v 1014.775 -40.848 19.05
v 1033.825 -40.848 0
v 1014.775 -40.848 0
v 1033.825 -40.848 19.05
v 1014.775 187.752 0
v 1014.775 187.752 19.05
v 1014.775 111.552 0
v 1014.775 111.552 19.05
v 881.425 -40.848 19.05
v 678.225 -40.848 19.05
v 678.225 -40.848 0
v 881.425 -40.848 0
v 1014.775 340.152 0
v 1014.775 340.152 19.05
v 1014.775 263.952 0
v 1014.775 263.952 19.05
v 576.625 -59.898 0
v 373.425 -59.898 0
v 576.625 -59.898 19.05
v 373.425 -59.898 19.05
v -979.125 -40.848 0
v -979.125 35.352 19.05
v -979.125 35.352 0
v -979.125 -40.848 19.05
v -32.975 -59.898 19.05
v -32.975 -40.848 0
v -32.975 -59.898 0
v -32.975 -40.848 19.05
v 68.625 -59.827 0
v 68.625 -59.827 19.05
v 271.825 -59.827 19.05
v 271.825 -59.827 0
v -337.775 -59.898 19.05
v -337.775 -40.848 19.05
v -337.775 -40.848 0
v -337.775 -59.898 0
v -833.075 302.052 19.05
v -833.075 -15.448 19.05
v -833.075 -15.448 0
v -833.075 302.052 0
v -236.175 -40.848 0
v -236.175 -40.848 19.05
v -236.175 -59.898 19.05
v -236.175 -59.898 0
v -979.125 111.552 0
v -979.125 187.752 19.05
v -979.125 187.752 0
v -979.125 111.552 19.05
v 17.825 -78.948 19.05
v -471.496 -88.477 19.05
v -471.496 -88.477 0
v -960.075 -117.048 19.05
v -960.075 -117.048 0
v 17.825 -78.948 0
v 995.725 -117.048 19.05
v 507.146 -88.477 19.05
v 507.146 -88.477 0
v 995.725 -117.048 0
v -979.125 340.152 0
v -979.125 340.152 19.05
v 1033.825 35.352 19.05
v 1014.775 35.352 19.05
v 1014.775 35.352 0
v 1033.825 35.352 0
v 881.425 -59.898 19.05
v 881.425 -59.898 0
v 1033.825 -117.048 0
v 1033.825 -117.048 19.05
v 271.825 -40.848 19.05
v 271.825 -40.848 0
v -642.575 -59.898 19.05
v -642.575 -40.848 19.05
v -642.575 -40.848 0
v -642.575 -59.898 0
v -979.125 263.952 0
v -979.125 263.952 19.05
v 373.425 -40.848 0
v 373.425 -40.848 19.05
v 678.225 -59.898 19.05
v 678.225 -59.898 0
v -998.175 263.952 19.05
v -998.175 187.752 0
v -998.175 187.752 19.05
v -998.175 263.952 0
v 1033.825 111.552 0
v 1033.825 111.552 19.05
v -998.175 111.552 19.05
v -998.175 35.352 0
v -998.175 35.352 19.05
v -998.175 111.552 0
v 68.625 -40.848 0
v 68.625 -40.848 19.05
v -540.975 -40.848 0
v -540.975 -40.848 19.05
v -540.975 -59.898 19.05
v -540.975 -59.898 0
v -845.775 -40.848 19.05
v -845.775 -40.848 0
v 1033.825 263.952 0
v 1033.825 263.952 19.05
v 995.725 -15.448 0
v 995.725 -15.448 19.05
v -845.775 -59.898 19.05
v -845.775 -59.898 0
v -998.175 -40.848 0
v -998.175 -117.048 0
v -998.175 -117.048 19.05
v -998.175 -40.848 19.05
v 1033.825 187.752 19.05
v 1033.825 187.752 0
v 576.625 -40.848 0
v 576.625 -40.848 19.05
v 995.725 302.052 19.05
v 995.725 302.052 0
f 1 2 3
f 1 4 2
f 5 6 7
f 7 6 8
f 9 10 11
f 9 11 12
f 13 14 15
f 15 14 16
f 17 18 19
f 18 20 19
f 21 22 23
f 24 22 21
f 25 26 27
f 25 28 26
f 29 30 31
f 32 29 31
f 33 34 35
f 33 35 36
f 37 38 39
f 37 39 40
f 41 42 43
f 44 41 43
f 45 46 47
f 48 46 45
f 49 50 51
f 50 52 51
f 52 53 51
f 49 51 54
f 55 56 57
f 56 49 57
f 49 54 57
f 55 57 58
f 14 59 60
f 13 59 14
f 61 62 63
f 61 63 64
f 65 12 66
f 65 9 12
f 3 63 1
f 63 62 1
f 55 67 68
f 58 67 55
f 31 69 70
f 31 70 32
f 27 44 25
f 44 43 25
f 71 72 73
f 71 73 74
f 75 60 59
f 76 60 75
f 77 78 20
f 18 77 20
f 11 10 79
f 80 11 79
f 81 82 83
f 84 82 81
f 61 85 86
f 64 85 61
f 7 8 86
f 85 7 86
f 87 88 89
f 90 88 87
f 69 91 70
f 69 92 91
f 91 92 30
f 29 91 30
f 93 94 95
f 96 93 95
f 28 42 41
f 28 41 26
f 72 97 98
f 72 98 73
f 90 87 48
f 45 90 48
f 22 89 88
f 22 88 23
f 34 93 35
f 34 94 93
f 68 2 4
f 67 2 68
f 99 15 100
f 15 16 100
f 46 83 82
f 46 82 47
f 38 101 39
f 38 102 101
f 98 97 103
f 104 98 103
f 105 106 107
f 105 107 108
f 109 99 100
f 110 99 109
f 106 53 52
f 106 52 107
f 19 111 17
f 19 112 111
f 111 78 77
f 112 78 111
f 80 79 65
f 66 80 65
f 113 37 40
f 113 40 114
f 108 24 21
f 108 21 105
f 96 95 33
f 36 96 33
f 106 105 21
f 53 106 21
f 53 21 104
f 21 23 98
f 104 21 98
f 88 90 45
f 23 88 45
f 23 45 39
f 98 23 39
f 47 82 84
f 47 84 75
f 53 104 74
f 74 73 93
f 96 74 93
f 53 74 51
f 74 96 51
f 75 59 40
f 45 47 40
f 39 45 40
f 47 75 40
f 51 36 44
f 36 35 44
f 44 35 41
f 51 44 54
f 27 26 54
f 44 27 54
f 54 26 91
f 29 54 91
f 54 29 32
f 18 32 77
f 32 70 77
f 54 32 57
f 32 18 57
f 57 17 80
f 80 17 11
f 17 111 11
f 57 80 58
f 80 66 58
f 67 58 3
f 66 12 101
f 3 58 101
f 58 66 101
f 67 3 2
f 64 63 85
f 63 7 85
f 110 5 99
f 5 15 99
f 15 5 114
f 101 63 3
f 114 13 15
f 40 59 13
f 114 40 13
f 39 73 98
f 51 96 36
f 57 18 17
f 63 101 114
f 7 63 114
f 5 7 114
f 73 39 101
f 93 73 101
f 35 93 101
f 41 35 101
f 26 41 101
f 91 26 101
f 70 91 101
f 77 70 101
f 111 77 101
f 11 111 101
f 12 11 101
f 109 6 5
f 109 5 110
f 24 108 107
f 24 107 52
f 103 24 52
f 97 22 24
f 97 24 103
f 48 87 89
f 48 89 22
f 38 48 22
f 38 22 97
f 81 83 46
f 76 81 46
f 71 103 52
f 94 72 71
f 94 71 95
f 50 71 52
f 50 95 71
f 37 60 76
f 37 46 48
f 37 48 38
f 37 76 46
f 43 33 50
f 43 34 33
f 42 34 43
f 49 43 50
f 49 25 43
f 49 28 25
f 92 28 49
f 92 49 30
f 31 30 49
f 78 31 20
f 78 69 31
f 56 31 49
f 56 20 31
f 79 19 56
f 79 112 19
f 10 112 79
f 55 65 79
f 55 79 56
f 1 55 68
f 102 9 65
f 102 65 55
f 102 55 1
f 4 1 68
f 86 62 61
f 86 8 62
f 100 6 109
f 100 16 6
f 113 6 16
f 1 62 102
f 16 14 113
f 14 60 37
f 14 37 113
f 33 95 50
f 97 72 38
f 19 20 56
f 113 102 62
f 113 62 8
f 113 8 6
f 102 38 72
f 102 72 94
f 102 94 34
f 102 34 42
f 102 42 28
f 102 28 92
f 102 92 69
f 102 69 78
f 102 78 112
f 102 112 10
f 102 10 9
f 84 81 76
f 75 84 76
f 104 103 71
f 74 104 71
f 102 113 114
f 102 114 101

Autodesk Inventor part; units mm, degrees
ref_plane "YZ Plane" through (0, 0, 0) normal (1, 0, 0) x (0, 1, 0)
ref_plane "XZ Plane" through (0, 0, 0) normal (0, 1, 0) x (-1, 0, 0)
ref_plane "XY Plane" through (0, 0, 0) normal (0, 0, 1) x (1, 0, 0)
sketch "Sketch1" plane through (0, 0, 0) normal (0, 0, 1) x (1, 0, 0)
  line L0 (-998.1754, 340.1521) -> (1033.8246, 340.1521)
  line L1 (1033.8246, 340.1521) -> (1033.8246, -117.0479)
  line L2 (-998.1754, -117.0479) -> (-998.1754, 340.1521)
  arc A0 (995.7246, -117.0479) -> (-960.0754, -117.0479) centre (17.8246, -12647.7146) ccw
  line L3 (1033.8246, -117.0479) -> (995.7246, -117.0479)
  line L4 (-960.0754, -117.0479) -> (-998.1754, -117.0479)
  point P0 (0, 0)
  dimension "d0" = 2032
  dimension "d1" = 457.2
extrude "Extrusion1" add sketch "Sketch1" along normal blind 19.05
sketch "Sketch2" plane through (0, 0, 19.05) normal (0, 0, 1) x (1, 0, 0)
  line L0 (1033.8246, 340.1521) -> (-998.1754, 340.1521) projected
  line L1 (-998.1754, -117.0479) -> (-960.0754, -117.0479) projected
  line L2 (-998.1754, 340.1521) -> (-979.1254, 340.1521)
  line L3 (-979.1254, 340.1521) -> (-979.1254, -117.0479)
  line L4 (-979.1254, -117.0479) -> (-998.1754, -117.0479)
  line L5 (-998.1754, -117.0479) -> (-998.1754, 340.1521)
  line L6 (1033.8246, -117.0479) -> (1033.8246, 340.1521) projected
  line L7 (1033.8246, 340.1521) -> (1014.7746, 340.1521)
  line L8 (1014.7746, 340.1521) -> (1014.7746, -117.0479)
  line L9 (1014.7746, -117.0479) -> (1033.8246, -117.0479)
  line L10 (1033.8246, -117.0479) -> (1033.8246, 340.1521)
  line L11 (-998.1754, 340.1521) -> (-998.1754, -117.0479) projected
  line L12 (-998.1754, 263.9521) -> (-979.1254, 263.9521)
  line L13 (1014.7746, 263.9521) -> (1033.8246, 263.9521)
  line L14 (-998.1754, 187.7521) -> (-979.1254, 187.7521)
  line L15 (1014.7746, 187.7521) -> (1033.8246, 187.7521)
  line L16 (-998.1754, 111.5521) -> (-979.1254, 111.5521)
  line L17 (1014.7746, 111.5521) -> (1033.8246, 111.5521)
  line L18 (-998.1754, 35.3521) -> (-979.1254, 35.3521)
  line L19 (1014.7746, 35.3521) -> (1033.8246, 35.3521)
  line L20 (1033.8246, -40.8479) -> (1014.7746, -40.8479)
  line L21 (-979.1254, -40.8479) -> (-998.1754, -40.8479)
  point P0 (0, 0)
  dimension "d7" = 19.05
  dimension "d8" = 19.05
extrude "Extrusion2" cut sketch "Sketch2" against normal blind 19.05 contours L6 L13 L8 L0 | L3 L12 L5 L0 | L6 L17 L8 L15 | L3 L16 L5 L14 | L6 L20 L8 L19 | L3 L21 L5 L18
sketch "Sketch4" plane through (0, 0, 19.05) normal (0, 0, 1) x (1, 0, 0)
  line L0 (-845.7754, -40.8479) -> (-845.7754, -59.8979)
  line L1 (-998.1754, 111.5521) -> (-998.1754, 35.3521) projected
  line L2 (-642.5754, -40.8479) -> (-642.5754, -59.8979)
  line L3 (-540.9754, -40.8479) -> (-540.9754, -59.8979)
  line L4 (-337.7754, -40.8479) -> (-337.7754, -59.8979)
  line L5 (-236.1754, -40.8479) -> (-236.1754, -59.8979)
  line L6 (-32.9754, -40.8479) -> (-32.9754, -59.8979)
  line L7 (68.6246, -40.8479) -> (68.6246, -59.8267)
  line L8 (271.8246, -40.8479) -> (271.8246, -59.8267)
  line L9 (373.4246, -40.8479) -> (373.4246, -59.8979)
  line L10 (576.6246, -40.8479) -> (576.6246, -59.8979)
  line L11 (678.2246, -40.8479) -> (678.2246, -59.8979)
  line L12 (881.4246, -40.8479) -> (881.4246, -59.8979)
  arc A0 (995.7246, -117.0479) -> (-960.0754, -117.0479) centre (17.8246, -12647.7146) ccw projected
  line L13 (-998.1754, -40.8479) -> (-998.1754, -117.0479) projected
  line L14 (1014.7746, 340.1521) -> (-979.1254, 340.1521) projected
  line L15 (1014.7746, 340.1521) -> (1014.7746, 263.9521) projected
  line L16 (-979.1254, 340.1521) -> (1014.7746, 340.1521)
  line L17 (-845.7754, -40.8479) -> (-642.5754, -40.8479)
  line L18 (-845.7754, -59.8979) -> (-642.5754, -59.8979)
  line L19 (-540.9754, -59.8979) -> (-337.7754, -59.8979)
  line L20 (-540.9754, -40.8479) -> (-337.7754, -40.8479)
  line L21 (-236.1754, -40.8479) -> (-32.9754, -40.8479)
  line L22 (68.6246, -40.8479) -> (271.8246, -40.8479)
  line L23 (373.4246, -59.8979) -> (576.6246, -59.8979)
  line L24 (678.2246, -59.8979) -> (881.4246, -59.8979)
  line L25 (373.4246, -40.8479) -> (576.6246, -40.8479)
  line L26 (678.2246, -40.8479) -> (881.4246, -40.8479)
  line L27 (-236.1754, -59.8979) -> (-32.9754, -59.8979)
  line L28 (68.6246, -59.8267) -> (271.8246, -59.8267)
  point P0 (0, 0)
  dimension "d18" = 152.4
  dimension "d19" = 203.2
  dimension "d26" = 457.2
  dimension "d27" = 203.2
  dimension "d28" = 101.6
  dimension "d29" = 203.2
  dimension "d30" = 101.6
  dimension "d31" = 101.6
  dimension "d32" = 101.6
  dimension "d33" = 203.2
  dimension "d34" = 203.2
  dimension "d35" = 203.2
extrude "Extrusion4" cut sketch "Sketch4" against normal blind 25.4
sketch "Sketch5" plane through (0, 0, 19.05) normal (0, 0, 1) x (1, 0, 0)
  line L0 (-833.0754, 302.0521) -> (995.7246, 302.0521)
  line L1 (995.7246, 302.0521) -> (995.7246, -15.4479)
  line L2 (995.7246, -15.4479) -> (-833.0754, -15.4479)
  line L3 (-833.0754, -15.4479) -> (-833.0754, 302.0521)
  line L4 (1014.7746, 340.1521) -> (-979.1254, 340.1521) projected
  line L5 (1033.8246, 187.7521) -> (1033.8246, 263.9521) projected
  point P0 (0, 0)
  dimension "d36" = 355.6
  dimension "d37" = 38.1
  dimension "d38" = 38.1
  dimension "d39" = 1828.8
extrude "Extrusion5" cut sketch "Sketch5" against normal blind 25.4
properties part number "front" material "Wood (Birch)"
